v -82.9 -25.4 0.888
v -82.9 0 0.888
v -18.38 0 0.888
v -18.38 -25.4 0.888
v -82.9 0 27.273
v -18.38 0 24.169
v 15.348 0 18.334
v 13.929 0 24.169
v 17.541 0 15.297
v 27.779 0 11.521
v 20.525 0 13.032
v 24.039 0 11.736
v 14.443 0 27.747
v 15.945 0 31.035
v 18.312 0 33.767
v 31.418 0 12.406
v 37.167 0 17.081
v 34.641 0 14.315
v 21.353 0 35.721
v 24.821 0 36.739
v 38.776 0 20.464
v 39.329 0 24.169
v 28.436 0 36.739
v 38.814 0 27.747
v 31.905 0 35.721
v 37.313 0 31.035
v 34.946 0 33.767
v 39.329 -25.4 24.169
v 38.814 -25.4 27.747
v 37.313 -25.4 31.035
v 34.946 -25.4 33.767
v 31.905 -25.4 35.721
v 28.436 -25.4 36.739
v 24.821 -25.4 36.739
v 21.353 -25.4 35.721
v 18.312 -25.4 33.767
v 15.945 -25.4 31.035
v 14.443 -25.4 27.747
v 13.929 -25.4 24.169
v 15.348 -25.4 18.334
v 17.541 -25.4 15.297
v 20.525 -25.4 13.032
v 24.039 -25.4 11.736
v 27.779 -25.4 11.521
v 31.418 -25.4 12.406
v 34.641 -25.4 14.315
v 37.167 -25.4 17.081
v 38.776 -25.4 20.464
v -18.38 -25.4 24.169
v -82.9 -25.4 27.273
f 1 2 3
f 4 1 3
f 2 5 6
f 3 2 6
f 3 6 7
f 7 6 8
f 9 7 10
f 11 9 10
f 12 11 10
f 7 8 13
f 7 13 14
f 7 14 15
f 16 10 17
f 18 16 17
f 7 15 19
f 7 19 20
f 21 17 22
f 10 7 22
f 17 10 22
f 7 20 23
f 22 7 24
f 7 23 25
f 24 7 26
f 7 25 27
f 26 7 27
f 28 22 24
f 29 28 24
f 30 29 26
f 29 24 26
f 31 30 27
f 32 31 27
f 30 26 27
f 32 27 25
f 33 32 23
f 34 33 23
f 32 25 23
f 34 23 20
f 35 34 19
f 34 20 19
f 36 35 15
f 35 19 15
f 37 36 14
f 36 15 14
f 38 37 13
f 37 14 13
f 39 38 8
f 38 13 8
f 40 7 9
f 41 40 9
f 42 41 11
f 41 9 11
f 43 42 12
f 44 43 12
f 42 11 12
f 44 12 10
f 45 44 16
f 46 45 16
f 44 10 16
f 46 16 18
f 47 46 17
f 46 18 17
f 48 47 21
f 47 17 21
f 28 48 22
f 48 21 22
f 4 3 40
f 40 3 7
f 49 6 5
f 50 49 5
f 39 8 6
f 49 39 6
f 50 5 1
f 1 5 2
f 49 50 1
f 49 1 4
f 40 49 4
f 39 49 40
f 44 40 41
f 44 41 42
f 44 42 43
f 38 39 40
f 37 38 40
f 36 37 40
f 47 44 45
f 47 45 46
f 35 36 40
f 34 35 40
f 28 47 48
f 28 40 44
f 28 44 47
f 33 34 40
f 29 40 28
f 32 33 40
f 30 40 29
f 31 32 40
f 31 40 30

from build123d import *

# Parameters (mm, degrees)
F1_DEPTH = 25.4


with BuildPart() as f1:
    # F0 (on Front) → F1 (new body)
    with BuildSketch(Plane.XZ):
        Polygon((-82.899797516, 27.2726975213), (-82.899797516, 0.8882751458), (-18.3799119938, 0.8882751458), (-18.3799119938, 24.1686472685), align=None)
        with BuildLine():
            Line((-18.3799119938, 24.1686472685), (-18.3799119938, 0.8882751458))
            Line((-18.3799119938, 0.8882751458), (15.3484408136, 18.3339759221))
            ThreePointArc((15.3484408136, 18.3339759221), (14.2888164515, 21.1662000872), (13.9288047385, 24.1686472685))
            Line((13.9288047385, 24.1686472685), (-18.3799119938, 24.1686472685))
        make_face()
        with BuildLine():
            Line((26.6288047385, 24.1686472685), (15.3484408136, 18.3339759221))
            ThreePointArc((15.3484408136, 18.3339759221), (29.6312519198, 11.8286589814), (39.3288047385, 24.1686472685))
            ThreePointArc((39.3288047385, 24.1686472685), (26.6288047385, 36.8686472685), (13.9288047385, 24.1686472685))
            Line((13.9288047385, 24.1686472685), (26.6288047385, 24.1686472685))
        make_face()
        with BuildLine():
            ThreePointArc((13.9288047385, 24.1686472685), (14.2888164515, 21.1662000872), (15.3484408136, 18.3339759221))
            Line((15.3484408136, 18.3339759221), (26.6288047385, 24.1686472685))
            Line((26.6288047385, 24.1686472685), (13.9288047385, 24.1686472685))
        make_face()
    extrude(amount=F1_DEPTH)


solid = f1.part
